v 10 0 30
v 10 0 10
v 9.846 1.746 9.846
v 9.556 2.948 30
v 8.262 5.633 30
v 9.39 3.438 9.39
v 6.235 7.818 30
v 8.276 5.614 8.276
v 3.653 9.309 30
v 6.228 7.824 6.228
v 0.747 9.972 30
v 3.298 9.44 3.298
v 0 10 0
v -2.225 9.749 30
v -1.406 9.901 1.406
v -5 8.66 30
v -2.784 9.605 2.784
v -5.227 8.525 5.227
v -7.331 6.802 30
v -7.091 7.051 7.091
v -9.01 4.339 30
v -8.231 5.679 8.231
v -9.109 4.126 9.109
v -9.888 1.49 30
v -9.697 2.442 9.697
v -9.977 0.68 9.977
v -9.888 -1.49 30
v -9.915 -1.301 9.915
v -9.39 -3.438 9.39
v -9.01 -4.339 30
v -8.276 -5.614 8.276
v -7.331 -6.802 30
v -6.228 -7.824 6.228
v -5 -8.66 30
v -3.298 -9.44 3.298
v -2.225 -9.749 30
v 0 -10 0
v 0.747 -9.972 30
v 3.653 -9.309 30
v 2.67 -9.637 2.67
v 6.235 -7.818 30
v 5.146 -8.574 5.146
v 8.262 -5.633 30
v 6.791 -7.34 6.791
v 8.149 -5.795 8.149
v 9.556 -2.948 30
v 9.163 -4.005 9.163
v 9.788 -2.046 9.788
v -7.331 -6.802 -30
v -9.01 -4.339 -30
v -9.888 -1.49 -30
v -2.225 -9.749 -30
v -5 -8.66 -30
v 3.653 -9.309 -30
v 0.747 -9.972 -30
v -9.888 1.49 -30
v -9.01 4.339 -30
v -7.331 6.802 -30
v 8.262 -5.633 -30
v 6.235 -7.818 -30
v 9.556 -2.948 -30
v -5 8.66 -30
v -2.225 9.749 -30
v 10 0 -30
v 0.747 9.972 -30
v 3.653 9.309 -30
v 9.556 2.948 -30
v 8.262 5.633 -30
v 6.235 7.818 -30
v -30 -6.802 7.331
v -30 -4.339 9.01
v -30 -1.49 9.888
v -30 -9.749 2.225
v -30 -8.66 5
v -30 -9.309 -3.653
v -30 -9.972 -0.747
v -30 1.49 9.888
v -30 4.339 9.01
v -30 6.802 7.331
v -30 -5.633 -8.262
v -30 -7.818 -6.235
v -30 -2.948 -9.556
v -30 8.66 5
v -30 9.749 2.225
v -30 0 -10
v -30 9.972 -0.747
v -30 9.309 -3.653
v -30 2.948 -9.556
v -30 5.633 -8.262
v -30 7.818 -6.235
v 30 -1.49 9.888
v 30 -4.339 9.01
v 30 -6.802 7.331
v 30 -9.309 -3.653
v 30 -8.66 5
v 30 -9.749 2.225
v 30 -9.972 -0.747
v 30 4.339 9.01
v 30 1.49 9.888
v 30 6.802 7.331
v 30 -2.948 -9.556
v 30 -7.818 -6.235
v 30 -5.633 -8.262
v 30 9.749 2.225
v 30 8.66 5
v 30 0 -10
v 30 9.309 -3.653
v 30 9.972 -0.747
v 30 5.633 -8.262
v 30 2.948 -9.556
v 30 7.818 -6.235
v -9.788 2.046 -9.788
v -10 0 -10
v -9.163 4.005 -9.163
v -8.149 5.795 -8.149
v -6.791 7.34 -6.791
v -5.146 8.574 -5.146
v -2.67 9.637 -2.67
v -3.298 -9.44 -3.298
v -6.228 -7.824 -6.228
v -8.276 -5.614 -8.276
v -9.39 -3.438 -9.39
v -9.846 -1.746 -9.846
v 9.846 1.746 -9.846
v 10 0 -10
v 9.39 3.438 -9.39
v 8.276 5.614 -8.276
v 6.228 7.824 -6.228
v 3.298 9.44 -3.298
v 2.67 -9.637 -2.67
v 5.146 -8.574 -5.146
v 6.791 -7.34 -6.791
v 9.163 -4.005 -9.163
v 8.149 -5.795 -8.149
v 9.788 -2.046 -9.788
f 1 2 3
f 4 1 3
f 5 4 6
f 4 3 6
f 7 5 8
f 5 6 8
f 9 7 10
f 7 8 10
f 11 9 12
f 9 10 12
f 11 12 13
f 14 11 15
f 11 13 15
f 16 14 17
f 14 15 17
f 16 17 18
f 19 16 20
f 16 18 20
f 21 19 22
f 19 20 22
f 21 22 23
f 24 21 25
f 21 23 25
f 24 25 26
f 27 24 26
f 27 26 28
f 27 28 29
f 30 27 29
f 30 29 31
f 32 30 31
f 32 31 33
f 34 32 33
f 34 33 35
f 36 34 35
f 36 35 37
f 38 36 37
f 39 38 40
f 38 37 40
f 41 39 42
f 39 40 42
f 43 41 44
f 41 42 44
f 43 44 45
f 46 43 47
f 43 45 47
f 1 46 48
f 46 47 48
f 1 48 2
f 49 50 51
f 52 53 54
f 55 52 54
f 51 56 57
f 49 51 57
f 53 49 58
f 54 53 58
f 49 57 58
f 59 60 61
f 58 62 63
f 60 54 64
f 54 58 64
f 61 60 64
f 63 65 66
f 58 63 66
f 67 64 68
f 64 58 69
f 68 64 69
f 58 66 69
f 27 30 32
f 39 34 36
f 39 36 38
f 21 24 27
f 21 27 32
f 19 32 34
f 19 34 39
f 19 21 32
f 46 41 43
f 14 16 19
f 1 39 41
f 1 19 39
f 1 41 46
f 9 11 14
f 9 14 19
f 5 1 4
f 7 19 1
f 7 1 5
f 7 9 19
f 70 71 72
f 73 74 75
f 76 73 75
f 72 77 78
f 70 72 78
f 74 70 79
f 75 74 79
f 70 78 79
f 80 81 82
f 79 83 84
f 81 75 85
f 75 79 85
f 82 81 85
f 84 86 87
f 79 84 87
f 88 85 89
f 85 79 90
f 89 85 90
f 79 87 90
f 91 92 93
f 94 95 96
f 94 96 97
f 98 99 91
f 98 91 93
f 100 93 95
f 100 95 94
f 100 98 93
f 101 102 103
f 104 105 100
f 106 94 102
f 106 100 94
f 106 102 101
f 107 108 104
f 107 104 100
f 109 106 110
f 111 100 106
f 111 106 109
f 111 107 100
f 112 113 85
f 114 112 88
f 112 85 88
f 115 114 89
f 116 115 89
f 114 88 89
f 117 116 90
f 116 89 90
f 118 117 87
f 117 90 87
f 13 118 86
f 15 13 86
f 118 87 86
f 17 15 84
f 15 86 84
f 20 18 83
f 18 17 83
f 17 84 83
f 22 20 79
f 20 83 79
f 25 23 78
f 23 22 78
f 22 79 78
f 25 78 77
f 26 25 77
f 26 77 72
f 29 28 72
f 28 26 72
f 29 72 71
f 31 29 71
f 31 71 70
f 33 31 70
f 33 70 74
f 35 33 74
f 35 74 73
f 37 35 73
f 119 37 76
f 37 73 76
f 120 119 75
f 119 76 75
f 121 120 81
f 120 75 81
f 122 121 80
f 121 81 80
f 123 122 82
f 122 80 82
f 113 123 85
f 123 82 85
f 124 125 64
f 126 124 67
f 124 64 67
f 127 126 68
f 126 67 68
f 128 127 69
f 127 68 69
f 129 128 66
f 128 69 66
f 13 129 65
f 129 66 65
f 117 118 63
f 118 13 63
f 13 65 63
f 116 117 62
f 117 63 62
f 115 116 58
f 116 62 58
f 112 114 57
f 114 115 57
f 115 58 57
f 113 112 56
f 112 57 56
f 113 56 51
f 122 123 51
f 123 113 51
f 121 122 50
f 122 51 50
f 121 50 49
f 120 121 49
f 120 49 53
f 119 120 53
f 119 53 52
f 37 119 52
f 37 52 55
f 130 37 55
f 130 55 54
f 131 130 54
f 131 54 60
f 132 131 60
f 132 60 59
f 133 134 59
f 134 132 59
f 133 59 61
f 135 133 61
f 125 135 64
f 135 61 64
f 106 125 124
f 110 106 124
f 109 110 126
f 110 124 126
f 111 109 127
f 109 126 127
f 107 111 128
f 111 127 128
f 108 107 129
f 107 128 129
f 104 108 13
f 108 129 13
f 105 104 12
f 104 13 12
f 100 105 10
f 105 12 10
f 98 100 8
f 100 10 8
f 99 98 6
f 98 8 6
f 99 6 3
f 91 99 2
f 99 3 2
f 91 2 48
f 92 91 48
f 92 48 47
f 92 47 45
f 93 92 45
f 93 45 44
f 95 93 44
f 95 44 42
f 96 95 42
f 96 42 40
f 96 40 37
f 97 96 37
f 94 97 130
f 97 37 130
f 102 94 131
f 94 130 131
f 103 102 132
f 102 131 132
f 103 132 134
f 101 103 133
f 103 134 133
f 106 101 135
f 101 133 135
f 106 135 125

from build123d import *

# Parameters (mm, degrees)
BOSS_EXTRUDE1_DEPTH      = 30
BOSS_EXTRUDE1_DEPTH_BACK = 30
SKETCH1_R                = 10
BOSS_EXTRUDE2_DEPTH      = 30
BOSS_EXTRUDE2_DEPTH_BACK = 30
SKETCH2_R                = 10


with BuildPart() as part:
    # Sketch1 → Boss-Extrude1 (new, two sides: drawn at the far end of the back side and taken through both)
    with BuildSketch(Plane.XY.offset(-BOSS_EXTRUDE1_DEPTH_BACK)):
        Circle(SKETCH1_R)
    extrude(amount=BOSS_EXTRUDE1_DEPTH + BOSS_EXTRUDE1_DEPTH_BACK)

    # Sketch2 → Boss-Extrude2 (add, two sides: drawn at the far end of the back side and taken through both)
    with BuildSketch(Plane(origin=(0, 0, 0), x_dir=(0, 0, -1), z_dir=(1, 0, 0)).offset(-BOSS_EXTRUDE2_DEPTH_BACK)):
        Circle(SKETCH2_R)
    extrude(amount=BOSS_EXTRUDE2_DEPTH + BOSS_EXTRUDE2_DEPTH_BACK)


solid = part.part
